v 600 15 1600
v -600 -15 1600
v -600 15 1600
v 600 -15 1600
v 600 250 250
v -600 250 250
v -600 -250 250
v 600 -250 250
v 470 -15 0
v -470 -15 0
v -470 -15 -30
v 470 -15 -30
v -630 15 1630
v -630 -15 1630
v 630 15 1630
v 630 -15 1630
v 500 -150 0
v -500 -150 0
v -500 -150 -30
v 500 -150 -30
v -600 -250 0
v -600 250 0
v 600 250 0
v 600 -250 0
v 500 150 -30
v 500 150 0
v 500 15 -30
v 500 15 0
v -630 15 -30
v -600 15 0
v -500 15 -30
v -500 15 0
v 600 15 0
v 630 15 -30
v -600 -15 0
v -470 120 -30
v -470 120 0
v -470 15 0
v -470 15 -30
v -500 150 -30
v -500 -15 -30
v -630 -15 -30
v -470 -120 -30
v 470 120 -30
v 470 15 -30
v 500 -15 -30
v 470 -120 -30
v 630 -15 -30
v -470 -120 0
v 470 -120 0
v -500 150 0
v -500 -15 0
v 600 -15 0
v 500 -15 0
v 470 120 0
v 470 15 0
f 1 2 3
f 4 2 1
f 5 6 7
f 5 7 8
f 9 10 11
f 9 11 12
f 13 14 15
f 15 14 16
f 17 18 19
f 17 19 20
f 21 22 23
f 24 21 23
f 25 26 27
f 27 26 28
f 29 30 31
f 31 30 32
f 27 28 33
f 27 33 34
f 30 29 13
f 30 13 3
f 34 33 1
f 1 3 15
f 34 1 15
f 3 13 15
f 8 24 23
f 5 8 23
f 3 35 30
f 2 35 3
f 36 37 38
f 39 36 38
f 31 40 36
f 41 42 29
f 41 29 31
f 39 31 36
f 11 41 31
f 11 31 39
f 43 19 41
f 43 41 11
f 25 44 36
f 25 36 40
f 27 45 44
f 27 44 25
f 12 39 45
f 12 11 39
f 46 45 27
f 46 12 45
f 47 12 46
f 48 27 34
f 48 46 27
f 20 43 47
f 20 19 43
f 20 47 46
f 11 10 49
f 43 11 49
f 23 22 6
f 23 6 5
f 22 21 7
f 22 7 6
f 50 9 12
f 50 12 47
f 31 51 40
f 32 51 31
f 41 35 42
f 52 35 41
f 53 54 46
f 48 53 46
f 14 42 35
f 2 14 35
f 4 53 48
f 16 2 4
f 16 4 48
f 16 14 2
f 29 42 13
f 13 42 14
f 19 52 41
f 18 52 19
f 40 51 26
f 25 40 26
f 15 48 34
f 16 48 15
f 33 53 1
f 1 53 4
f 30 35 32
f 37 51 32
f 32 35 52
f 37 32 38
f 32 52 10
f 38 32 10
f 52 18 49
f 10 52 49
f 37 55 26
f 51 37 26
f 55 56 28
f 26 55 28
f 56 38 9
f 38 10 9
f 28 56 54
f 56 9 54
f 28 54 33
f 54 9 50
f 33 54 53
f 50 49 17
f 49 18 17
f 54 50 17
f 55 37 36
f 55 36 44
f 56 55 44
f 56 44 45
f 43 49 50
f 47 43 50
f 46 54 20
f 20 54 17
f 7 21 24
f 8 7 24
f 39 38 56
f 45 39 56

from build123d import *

# Parameters (mm, degrees)
F0_W     = 1200
F0_H     = 500
F1_DEPTH = 250
F2_W     = 1260
F2_H     = 1660
F2_W_2   = 1200
F2_H_2   = 1600
F3_DEPTH = 15
F4_W     = 1000
F4_H     = 300
F4_W_2   = 940
F4_H_2   = 240
F5_DEPTH = 30


with BuildPart() as f1:
    # F0 (on Top) → F1 (new body)
    with BuildSketch(Plane.XY):
        Rectangle(F0_W, F0_H)
    extrude(amount=F1_DEPTH)


with BuildPart() as f3:
    # F2 (on Front) → F3 (new body, symmetric)
    with BuildSketch(Plane.XZ):
        with Locations((0, 800)):
            Rectangle(F2_W, F2_H)
        with Locations((0, 800)):
            Rectangle(F2_W_2, F2_H_2, mode=Mode.SUBTRACT)
    extrude(amount=F3_DEPTH, both=True)

    # F4 (on face) → F5 (join)
    with BuildSketch(Plane(origin=(0, 0, 0), x_dir=(1, 0, 0), z_dir=(0, 0, -1))):
        Rectangle(F4_W, F4_H)
        Rectangle(F4_W_2, F4_H_2, mode=Mode.SUBTRACT)
    extrude(amount=F5_DEPTH)


solid = Compound([f1.part, f3.part])
